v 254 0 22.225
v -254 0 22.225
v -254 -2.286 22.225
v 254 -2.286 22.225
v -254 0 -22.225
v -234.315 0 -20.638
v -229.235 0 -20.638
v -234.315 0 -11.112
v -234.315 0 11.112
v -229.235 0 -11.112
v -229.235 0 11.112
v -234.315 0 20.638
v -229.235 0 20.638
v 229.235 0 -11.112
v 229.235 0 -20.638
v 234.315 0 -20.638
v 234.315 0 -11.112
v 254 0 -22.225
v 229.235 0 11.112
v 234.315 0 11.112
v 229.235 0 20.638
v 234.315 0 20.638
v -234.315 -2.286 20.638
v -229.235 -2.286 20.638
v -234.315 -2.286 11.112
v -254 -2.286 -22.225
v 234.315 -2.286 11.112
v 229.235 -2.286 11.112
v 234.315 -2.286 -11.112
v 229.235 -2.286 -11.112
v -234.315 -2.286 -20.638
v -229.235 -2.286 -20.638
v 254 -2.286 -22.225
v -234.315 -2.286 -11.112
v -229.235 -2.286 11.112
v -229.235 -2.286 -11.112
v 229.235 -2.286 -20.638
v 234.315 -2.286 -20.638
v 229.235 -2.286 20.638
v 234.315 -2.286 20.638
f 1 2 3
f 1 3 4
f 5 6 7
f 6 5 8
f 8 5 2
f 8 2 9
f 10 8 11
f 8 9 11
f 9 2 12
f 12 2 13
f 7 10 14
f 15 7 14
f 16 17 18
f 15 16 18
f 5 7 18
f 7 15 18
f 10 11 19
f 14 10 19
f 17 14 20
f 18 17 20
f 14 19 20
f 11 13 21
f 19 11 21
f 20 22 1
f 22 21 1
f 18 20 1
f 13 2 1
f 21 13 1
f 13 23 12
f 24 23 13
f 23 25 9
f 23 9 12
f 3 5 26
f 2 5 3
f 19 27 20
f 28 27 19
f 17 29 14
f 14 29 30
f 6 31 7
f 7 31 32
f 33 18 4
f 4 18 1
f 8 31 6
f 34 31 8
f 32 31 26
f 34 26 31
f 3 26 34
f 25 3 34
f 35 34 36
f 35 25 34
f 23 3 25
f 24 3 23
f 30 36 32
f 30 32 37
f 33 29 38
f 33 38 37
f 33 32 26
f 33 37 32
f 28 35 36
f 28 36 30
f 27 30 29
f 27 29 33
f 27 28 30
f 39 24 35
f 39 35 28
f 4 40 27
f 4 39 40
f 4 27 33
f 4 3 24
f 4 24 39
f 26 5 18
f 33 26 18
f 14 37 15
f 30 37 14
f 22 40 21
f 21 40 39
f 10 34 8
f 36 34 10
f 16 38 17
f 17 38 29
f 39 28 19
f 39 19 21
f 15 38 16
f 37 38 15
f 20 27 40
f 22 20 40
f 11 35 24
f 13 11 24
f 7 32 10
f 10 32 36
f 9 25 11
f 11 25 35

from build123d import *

# Parameters (mm, degrees)
F0_W     = 508
F0_H     = 44.45
F1_DEPTH = 2.286
F2_W     = 5.08
F2_H     = 9.525
F3_DEPTH = 2.287


# Not quite as in the source:
# - a pattern or mirror of a feature is missing from the dataset's text; its kind, count and spacing are read off the source's solid


with BuildPart() as f1:
    # F0 (on Front) → F1 (new body)
    with BuildSketch(Plane.XZ):
        Rectangle(F0_W, F0_H)
    extrude(amount=F1_DEPTH)

    # F2 (on face) → F3 (cut, through all)
    with BuildSketch(Plane.XZ.offset(2.286)):
        with Locations((-231.775, 15.875)):
            Rectangle(F2_W, F2_H)
        with Locations((-231.775, -15.875)):
            Rectangle(F2_W, F2_H)
    f3 = extrude(amount=-F3_DEPTH, mode=Mode.SUBTRACT)

    # F3_copies: F3 across plane
    add(f3.mirror(Plane(origin=(0, 0, 0), x_dir=(0, 0, 1), z_dir=(1, 0, 0))), mode=Mode.SUBTRACT)


solid = f1.part
